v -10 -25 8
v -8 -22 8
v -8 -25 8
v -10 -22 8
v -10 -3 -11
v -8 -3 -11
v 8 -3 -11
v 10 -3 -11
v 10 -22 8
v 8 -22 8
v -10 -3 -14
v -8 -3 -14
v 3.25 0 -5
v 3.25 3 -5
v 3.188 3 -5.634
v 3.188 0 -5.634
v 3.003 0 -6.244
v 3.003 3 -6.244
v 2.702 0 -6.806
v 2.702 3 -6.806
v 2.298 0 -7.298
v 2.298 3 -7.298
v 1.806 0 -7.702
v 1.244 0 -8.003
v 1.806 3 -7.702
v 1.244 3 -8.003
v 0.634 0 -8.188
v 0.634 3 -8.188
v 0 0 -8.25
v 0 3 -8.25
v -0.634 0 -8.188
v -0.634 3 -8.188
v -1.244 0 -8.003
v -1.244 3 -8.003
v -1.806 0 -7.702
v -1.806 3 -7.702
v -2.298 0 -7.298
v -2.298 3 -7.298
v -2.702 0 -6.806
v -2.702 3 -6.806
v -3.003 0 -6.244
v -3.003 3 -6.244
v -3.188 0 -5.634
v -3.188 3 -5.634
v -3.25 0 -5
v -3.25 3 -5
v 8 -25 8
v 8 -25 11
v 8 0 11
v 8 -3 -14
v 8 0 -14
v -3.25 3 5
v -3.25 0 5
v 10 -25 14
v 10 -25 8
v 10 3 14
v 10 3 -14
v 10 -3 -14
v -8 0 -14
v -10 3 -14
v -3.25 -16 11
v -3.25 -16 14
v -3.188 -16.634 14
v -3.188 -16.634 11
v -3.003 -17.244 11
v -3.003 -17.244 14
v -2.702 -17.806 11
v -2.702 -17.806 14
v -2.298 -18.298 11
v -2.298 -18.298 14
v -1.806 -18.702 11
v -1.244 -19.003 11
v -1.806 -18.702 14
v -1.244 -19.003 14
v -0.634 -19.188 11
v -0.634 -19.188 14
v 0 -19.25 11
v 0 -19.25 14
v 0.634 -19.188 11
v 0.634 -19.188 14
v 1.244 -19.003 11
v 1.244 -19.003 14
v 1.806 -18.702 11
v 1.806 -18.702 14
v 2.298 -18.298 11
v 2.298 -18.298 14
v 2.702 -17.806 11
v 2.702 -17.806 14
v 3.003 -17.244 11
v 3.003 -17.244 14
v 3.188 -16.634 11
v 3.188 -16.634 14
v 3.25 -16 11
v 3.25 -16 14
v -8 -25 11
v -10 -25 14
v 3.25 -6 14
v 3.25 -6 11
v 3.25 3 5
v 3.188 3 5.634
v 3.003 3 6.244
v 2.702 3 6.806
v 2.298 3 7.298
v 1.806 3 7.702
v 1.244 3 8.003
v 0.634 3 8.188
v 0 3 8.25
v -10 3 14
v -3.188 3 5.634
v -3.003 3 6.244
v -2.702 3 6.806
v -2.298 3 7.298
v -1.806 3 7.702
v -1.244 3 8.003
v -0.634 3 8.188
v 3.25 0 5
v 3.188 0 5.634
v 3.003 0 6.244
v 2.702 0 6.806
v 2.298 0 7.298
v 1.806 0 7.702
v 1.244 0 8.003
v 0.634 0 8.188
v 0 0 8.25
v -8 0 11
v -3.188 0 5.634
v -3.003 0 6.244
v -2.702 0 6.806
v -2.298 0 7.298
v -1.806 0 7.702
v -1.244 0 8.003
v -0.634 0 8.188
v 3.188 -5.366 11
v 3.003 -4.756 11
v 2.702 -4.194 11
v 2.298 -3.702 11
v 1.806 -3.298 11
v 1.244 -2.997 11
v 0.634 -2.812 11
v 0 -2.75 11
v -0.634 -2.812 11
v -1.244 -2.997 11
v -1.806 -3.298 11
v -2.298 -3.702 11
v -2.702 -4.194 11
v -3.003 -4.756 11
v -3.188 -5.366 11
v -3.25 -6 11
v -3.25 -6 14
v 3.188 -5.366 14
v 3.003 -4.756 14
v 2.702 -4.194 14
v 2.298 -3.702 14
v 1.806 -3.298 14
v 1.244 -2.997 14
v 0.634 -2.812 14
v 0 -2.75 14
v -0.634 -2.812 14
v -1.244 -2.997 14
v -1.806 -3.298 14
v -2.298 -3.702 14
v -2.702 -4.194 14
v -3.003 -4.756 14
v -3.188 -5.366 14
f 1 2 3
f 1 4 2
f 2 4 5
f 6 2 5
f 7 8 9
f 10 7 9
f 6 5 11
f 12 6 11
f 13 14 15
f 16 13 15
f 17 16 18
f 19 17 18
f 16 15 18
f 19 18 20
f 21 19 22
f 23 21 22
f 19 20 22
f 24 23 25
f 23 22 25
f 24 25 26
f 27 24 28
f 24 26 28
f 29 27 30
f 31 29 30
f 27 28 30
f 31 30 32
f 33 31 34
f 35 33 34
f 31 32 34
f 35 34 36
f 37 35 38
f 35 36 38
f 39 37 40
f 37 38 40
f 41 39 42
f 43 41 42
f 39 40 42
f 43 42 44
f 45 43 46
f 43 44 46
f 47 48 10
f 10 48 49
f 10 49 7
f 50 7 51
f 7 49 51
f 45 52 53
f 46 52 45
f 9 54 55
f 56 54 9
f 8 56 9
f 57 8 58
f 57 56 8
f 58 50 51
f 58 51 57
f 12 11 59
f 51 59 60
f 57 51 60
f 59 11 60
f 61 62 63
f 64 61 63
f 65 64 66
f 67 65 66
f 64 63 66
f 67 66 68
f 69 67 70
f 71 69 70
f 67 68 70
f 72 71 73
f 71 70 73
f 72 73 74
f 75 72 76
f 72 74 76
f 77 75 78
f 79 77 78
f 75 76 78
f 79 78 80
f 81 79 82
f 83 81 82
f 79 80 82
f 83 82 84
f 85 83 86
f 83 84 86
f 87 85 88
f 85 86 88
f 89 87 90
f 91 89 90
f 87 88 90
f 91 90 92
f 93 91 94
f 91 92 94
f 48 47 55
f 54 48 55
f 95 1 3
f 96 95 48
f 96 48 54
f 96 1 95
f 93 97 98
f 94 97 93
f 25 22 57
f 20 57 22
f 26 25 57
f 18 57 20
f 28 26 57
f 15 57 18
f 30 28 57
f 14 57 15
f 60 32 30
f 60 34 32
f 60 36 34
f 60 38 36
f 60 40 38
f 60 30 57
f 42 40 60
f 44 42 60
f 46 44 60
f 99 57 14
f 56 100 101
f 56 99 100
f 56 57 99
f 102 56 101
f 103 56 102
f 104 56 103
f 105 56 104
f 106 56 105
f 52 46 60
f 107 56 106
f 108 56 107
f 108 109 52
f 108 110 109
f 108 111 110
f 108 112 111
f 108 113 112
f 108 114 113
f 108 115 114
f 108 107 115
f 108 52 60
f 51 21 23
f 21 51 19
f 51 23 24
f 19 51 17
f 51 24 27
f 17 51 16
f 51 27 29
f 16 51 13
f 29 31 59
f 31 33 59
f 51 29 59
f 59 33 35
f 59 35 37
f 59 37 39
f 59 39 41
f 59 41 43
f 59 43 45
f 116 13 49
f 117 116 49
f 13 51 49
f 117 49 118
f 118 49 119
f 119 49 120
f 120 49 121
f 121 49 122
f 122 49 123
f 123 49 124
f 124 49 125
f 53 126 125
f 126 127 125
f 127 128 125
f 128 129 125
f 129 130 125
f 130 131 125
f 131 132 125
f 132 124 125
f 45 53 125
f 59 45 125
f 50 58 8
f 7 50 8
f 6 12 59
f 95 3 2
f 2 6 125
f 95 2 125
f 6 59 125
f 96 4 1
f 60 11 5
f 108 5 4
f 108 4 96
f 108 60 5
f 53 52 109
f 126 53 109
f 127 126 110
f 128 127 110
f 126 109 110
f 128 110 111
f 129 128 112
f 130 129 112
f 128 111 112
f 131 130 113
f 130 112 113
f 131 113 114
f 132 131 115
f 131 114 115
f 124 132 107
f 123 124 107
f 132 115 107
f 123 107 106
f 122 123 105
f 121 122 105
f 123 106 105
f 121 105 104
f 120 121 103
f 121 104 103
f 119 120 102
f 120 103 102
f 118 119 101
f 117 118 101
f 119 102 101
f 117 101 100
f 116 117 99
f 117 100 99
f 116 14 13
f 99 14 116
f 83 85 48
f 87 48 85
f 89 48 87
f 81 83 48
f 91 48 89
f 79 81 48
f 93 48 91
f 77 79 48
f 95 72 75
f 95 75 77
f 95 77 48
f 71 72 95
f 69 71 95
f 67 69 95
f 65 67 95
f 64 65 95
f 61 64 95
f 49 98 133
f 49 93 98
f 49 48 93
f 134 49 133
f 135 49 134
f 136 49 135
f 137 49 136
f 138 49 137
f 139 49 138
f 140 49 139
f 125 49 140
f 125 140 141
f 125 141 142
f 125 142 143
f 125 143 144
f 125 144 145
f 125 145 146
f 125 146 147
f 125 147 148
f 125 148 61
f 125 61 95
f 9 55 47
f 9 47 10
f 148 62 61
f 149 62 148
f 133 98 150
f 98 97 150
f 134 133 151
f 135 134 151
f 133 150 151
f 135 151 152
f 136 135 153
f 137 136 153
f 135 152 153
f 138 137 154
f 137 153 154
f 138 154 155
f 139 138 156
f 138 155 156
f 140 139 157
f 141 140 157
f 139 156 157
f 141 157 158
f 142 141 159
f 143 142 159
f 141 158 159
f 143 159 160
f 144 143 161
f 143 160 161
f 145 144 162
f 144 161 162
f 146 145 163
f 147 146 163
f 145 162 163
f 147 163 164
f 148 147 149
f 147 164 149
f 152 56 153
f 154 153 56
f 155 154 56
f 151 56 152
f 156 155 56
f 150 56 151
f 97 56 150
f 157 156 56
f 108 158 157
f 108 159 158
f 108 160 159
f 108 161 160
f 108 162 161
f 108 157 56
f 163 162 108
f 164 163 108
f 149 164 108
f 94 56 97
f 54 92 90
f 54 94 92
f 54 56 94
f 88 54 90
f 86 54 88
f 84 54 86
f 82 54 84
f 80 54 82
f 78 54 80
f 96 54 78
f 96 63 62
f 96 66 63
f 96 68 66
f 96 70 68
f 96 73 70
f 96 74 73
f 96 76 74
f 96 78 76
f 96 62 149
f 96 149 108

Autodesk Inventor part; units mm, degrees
ref_plane "YZ Plane" through (0, 0, 0) normal (1, 0, 0) x (0, 1, 0)
ref_plane "XZ Plane" through (0, 0, 0) normal (0, 1, 0) x (-1, 0, 0)
ref_plane "XY Plane" through (0, 0, 0) normal (0, 0, 1) x (1, 0, 0)
sketch "Sketch1" plane through (0, 0, 0) normal (0, 1, 0) x (-1, 0, 0)
  line L0 (10, -14) -> (-10, -14)
  line L1 (-10, -14) -> (-10, 14)
  line L2 (-10, 14) -> (10, 14)
  line L3 (10, 14) -> (10, -14)
  line L4 (10, -14) -> (-10, 14) construction
  line L5 (-10, -14) -> (10, 14) construction
  point P0 (0, 0)
  dimension "d0" = 20
  dimension "d1" = 28
extrude "Extrusion1" add sketch "Sketch1" along normal blind 3
sketch "Sketch2" plane through (0, 0, 0) normal (0, -1, 0) x (1, 0, 0)
  line L0 (-10, 14) -> (10, 14) projected
  line L1 (-10, 14) -> (10, 14)
  line L2 (10, 14) -> (10, 11)
  line L3 (10, 11) -> (-10, 11)
  line L4 (-10, 11) -> (-10, 14)
  point P0 (0, 0)
  dimension "d4" = 20
  dimension "d5" = 3
extrude "Extrusion2" add sketch "Sketch2" along normal blind 25
sketch "Sketch3" plane through (10, 0, -14) normal (1, 0, 0) x (0, 0, -1)
  line L0 (-25, 0) -> (-25, -25) projected
  line L1 (0, 0) -> (-25, 0) projected
  line L2 (0, 0) -> (-25, 0)
  line L3 (-25, 0) -> (-25, -25)
  line L4 (-25, -25) -> (-22, -25)
  line L5 (-22, -25) -> (-22, -22)
  line L6 (0, 0) -> (0, 3) projected
  line L7 (0, 0) -> (0, -3)
  line L8 (0, -3) -> (-3, -3)
  line L9 (-3, -3) -> (-22, -22)
  point P0 (-14, 0)
  dimension "d8" = 3
  dimension "d9" = 3
  dimension "d10" = 3
  dimension "d11" = 3
extrude "Extrusion3" add sketch "Sketch3" against normal blind 2
mirror "Mirror1" about plane through (0, 0, 0) normal (1, 0, 0) of "Extrusion3"
sketch "Sketch4" plane through (-10, 3, 14) normal (0, 0, 1) x (1, 0, 0)
  line L0 (2, -28) -> (18, -28) projected
  line L1 (6.75, -9) -> (13.25, -9)
  line L2 (13.25, -9) -> (13.25, -19)
  line L3 (13.25, -19) -> (6.75, -19)
  line L4 (6.75, -19) -> (6.75, -9)
  line L5 (6.75, -9) -> (13.25, -19) construction
  line L6 (13.25, -9) -> (6.75, -19) construction
  arc A0 (13.25, -9) -> (6.75, -9) centre (10, -9) ccw
  arc A1 (6.75, -19) -> (13.25, -19) centre (10, -19) ccw
  point P0 (10, -3)
  point P1 (10, -14)
  dimension "d14" = 6.5
  dimension "d15" = 10
extrude "Extrusion4" cut sketch "Sketch4" against normal through all
sketch "Sketch5" plane through (0, 3, 0) normal (0, 1, 0) x (1, 0, 0)
  line L0 (3.25, -5) -> (-3.25, -5)
  line L1 (-3.25, -5) -> (-3.25, 5)
  line L2 (-3.25, 5) -> (3.25, 5)
  line L3 (3.25, 5) -> (3.25, -5)
  line L4 (3.25, -5) -> (-3.25, 5) construction
  line L5 (-3.25, -5) -> (3.25, 5) construction
  arc A0 (-3.25, -5) -> (3.25, -5) centre (0, -5) ccw
  arc A1 (3.25, 5) -> (-3.25, 5) centre (0, 5) ccw
  point P0 (0, 0)
  dimension "d18" = 6.5
  dimension "d19" = 10
extrude "Extrusion5" cut sketch "Sketch5" against normal through all
properties part number "Ke NHOM 28x28x20"
